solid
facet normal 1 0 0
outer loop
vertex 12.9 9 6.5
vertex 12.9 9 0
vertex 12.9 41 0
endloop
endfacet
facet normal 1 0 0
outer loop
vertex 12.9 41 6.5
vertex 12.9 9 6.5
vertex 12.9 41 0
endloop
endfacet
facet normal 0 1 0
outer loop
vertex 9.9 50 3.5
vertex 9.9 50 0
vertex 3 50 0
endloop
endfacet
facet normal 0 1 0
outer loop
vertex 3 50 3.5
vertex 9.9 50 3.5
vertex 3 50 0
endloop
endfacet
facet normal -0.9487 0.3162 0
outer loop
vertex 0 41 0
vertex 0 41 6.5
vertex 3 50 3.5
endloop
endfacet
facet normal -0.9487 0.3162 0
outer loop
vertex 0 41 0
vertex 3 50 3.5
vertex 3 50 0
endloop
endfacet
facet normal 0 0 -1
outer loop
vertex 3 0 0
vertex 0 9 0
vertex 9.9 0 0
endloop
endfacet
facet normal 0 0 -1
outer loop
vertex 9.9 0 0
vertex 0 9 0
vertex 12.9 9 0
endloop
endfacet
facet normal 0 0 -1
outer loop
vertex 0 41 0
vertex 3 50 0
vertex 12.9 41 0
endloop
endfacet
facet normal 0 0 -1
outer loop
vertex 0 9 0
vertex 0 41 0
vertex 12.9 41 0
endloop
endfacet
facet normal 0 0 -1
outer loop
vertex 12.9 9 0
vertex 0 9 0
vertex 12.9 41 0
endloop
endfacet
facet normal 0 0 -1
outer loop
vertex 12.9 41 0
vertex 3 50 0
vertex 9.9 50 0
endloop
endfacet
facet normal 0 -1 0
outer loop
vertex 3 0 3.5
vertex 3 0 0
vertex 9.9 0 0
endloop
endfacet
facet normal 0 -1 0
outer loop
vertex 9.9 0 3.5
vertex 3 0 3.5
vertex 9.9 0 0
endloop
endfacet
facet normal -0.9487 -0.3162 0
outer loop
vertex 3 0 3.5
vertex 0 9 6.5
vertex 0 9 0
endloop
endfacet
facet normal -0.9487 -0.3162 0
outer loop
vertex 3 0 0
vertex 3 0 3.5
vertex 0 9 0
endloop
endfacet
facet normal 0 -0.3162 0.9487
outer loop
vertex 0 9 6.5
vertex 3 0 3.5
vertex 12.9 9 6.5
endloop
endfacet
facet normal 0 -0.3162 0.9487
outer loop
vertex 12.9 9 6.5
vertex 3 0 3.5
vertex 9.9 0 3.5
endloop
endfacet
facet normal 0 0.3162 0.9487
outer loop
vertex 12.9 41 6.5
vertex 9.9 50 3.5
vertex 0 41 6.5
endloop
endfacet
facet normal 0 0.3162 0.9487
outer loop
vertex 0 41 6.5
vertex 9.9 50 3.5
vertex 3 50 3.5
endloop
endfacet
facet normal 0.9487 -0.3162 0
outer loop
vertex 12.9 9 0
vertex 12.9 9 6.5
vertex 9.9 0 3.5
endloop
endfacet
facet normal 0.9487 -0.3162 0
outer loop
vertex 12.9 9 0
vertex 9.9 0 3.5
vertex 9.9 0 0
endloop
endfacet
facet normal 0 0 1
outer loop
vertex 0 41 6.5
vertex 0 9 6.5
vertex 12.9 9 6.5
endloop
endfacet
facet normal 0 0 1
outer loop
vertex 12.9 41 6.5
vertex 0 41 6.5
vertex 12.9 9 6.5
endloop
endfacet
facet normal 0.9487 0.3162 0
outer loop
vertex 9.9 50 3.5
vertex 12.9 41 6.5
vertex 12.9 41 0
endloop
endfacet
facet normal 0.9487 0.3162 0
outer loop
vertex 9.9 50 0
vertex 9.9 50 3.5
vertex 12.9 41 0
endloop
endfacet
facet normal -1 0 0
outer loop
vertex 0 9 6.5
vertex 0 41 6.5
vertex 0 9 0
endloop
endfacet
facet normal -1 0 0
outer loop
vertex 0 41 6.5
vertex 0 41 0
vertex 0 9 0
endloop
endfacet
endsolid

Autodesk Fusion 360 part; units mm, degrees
sketch "Sketch1" plane through (0, 0, 0) normal (0, 0, 1) x (1, 0, 0)
  line L0 (0, 0) -> (12.9, 0)
  line L1 (12.9, 0) -> (12.9, 50)
  line L2 (12.9, 50) -> (0, 50)
  line L3 (0, 50) -> (0, 0)
  dimension "d1" = 12.9
  dimension "d2" = 50
extrude "Extrude1" add sketch "Sketch1" along normal blind 6.5
chamfer "Chamfer1" distance 9 distance2 3 2 edges at (0, 0, 3.25) (12.9, 50, 3.25) measured on face at (0, 33.3333, 4.3333) measured on face at (12.9, 16.6667, 4.3333)
chamfer "Chamfer2" distance 3 distance2 9 2 edges at (12.9, 0, 3.25) (0, 50, 3.25) measured on face at (6.3, 0, 2.1667) measured on face at (6.6, 50, 2.1667)
chamfer "Chamfer3" distance 9 distance2 3 1 edges at (6.45, 50, 6.5) measured on face at (4.3, 19.6667, 6.5)
chamfer "Chamfer4" distance 9 distance2 3 1 edges at (6.45, 0, 6.5) measured on face at (4.3, 30.3333, 6.5)
equation "d5 = splinter"
equation "d8 = splinter"
equation "d9 = splinter"
equation "d11 = splinter"
equation "splinter = 9 mm"
